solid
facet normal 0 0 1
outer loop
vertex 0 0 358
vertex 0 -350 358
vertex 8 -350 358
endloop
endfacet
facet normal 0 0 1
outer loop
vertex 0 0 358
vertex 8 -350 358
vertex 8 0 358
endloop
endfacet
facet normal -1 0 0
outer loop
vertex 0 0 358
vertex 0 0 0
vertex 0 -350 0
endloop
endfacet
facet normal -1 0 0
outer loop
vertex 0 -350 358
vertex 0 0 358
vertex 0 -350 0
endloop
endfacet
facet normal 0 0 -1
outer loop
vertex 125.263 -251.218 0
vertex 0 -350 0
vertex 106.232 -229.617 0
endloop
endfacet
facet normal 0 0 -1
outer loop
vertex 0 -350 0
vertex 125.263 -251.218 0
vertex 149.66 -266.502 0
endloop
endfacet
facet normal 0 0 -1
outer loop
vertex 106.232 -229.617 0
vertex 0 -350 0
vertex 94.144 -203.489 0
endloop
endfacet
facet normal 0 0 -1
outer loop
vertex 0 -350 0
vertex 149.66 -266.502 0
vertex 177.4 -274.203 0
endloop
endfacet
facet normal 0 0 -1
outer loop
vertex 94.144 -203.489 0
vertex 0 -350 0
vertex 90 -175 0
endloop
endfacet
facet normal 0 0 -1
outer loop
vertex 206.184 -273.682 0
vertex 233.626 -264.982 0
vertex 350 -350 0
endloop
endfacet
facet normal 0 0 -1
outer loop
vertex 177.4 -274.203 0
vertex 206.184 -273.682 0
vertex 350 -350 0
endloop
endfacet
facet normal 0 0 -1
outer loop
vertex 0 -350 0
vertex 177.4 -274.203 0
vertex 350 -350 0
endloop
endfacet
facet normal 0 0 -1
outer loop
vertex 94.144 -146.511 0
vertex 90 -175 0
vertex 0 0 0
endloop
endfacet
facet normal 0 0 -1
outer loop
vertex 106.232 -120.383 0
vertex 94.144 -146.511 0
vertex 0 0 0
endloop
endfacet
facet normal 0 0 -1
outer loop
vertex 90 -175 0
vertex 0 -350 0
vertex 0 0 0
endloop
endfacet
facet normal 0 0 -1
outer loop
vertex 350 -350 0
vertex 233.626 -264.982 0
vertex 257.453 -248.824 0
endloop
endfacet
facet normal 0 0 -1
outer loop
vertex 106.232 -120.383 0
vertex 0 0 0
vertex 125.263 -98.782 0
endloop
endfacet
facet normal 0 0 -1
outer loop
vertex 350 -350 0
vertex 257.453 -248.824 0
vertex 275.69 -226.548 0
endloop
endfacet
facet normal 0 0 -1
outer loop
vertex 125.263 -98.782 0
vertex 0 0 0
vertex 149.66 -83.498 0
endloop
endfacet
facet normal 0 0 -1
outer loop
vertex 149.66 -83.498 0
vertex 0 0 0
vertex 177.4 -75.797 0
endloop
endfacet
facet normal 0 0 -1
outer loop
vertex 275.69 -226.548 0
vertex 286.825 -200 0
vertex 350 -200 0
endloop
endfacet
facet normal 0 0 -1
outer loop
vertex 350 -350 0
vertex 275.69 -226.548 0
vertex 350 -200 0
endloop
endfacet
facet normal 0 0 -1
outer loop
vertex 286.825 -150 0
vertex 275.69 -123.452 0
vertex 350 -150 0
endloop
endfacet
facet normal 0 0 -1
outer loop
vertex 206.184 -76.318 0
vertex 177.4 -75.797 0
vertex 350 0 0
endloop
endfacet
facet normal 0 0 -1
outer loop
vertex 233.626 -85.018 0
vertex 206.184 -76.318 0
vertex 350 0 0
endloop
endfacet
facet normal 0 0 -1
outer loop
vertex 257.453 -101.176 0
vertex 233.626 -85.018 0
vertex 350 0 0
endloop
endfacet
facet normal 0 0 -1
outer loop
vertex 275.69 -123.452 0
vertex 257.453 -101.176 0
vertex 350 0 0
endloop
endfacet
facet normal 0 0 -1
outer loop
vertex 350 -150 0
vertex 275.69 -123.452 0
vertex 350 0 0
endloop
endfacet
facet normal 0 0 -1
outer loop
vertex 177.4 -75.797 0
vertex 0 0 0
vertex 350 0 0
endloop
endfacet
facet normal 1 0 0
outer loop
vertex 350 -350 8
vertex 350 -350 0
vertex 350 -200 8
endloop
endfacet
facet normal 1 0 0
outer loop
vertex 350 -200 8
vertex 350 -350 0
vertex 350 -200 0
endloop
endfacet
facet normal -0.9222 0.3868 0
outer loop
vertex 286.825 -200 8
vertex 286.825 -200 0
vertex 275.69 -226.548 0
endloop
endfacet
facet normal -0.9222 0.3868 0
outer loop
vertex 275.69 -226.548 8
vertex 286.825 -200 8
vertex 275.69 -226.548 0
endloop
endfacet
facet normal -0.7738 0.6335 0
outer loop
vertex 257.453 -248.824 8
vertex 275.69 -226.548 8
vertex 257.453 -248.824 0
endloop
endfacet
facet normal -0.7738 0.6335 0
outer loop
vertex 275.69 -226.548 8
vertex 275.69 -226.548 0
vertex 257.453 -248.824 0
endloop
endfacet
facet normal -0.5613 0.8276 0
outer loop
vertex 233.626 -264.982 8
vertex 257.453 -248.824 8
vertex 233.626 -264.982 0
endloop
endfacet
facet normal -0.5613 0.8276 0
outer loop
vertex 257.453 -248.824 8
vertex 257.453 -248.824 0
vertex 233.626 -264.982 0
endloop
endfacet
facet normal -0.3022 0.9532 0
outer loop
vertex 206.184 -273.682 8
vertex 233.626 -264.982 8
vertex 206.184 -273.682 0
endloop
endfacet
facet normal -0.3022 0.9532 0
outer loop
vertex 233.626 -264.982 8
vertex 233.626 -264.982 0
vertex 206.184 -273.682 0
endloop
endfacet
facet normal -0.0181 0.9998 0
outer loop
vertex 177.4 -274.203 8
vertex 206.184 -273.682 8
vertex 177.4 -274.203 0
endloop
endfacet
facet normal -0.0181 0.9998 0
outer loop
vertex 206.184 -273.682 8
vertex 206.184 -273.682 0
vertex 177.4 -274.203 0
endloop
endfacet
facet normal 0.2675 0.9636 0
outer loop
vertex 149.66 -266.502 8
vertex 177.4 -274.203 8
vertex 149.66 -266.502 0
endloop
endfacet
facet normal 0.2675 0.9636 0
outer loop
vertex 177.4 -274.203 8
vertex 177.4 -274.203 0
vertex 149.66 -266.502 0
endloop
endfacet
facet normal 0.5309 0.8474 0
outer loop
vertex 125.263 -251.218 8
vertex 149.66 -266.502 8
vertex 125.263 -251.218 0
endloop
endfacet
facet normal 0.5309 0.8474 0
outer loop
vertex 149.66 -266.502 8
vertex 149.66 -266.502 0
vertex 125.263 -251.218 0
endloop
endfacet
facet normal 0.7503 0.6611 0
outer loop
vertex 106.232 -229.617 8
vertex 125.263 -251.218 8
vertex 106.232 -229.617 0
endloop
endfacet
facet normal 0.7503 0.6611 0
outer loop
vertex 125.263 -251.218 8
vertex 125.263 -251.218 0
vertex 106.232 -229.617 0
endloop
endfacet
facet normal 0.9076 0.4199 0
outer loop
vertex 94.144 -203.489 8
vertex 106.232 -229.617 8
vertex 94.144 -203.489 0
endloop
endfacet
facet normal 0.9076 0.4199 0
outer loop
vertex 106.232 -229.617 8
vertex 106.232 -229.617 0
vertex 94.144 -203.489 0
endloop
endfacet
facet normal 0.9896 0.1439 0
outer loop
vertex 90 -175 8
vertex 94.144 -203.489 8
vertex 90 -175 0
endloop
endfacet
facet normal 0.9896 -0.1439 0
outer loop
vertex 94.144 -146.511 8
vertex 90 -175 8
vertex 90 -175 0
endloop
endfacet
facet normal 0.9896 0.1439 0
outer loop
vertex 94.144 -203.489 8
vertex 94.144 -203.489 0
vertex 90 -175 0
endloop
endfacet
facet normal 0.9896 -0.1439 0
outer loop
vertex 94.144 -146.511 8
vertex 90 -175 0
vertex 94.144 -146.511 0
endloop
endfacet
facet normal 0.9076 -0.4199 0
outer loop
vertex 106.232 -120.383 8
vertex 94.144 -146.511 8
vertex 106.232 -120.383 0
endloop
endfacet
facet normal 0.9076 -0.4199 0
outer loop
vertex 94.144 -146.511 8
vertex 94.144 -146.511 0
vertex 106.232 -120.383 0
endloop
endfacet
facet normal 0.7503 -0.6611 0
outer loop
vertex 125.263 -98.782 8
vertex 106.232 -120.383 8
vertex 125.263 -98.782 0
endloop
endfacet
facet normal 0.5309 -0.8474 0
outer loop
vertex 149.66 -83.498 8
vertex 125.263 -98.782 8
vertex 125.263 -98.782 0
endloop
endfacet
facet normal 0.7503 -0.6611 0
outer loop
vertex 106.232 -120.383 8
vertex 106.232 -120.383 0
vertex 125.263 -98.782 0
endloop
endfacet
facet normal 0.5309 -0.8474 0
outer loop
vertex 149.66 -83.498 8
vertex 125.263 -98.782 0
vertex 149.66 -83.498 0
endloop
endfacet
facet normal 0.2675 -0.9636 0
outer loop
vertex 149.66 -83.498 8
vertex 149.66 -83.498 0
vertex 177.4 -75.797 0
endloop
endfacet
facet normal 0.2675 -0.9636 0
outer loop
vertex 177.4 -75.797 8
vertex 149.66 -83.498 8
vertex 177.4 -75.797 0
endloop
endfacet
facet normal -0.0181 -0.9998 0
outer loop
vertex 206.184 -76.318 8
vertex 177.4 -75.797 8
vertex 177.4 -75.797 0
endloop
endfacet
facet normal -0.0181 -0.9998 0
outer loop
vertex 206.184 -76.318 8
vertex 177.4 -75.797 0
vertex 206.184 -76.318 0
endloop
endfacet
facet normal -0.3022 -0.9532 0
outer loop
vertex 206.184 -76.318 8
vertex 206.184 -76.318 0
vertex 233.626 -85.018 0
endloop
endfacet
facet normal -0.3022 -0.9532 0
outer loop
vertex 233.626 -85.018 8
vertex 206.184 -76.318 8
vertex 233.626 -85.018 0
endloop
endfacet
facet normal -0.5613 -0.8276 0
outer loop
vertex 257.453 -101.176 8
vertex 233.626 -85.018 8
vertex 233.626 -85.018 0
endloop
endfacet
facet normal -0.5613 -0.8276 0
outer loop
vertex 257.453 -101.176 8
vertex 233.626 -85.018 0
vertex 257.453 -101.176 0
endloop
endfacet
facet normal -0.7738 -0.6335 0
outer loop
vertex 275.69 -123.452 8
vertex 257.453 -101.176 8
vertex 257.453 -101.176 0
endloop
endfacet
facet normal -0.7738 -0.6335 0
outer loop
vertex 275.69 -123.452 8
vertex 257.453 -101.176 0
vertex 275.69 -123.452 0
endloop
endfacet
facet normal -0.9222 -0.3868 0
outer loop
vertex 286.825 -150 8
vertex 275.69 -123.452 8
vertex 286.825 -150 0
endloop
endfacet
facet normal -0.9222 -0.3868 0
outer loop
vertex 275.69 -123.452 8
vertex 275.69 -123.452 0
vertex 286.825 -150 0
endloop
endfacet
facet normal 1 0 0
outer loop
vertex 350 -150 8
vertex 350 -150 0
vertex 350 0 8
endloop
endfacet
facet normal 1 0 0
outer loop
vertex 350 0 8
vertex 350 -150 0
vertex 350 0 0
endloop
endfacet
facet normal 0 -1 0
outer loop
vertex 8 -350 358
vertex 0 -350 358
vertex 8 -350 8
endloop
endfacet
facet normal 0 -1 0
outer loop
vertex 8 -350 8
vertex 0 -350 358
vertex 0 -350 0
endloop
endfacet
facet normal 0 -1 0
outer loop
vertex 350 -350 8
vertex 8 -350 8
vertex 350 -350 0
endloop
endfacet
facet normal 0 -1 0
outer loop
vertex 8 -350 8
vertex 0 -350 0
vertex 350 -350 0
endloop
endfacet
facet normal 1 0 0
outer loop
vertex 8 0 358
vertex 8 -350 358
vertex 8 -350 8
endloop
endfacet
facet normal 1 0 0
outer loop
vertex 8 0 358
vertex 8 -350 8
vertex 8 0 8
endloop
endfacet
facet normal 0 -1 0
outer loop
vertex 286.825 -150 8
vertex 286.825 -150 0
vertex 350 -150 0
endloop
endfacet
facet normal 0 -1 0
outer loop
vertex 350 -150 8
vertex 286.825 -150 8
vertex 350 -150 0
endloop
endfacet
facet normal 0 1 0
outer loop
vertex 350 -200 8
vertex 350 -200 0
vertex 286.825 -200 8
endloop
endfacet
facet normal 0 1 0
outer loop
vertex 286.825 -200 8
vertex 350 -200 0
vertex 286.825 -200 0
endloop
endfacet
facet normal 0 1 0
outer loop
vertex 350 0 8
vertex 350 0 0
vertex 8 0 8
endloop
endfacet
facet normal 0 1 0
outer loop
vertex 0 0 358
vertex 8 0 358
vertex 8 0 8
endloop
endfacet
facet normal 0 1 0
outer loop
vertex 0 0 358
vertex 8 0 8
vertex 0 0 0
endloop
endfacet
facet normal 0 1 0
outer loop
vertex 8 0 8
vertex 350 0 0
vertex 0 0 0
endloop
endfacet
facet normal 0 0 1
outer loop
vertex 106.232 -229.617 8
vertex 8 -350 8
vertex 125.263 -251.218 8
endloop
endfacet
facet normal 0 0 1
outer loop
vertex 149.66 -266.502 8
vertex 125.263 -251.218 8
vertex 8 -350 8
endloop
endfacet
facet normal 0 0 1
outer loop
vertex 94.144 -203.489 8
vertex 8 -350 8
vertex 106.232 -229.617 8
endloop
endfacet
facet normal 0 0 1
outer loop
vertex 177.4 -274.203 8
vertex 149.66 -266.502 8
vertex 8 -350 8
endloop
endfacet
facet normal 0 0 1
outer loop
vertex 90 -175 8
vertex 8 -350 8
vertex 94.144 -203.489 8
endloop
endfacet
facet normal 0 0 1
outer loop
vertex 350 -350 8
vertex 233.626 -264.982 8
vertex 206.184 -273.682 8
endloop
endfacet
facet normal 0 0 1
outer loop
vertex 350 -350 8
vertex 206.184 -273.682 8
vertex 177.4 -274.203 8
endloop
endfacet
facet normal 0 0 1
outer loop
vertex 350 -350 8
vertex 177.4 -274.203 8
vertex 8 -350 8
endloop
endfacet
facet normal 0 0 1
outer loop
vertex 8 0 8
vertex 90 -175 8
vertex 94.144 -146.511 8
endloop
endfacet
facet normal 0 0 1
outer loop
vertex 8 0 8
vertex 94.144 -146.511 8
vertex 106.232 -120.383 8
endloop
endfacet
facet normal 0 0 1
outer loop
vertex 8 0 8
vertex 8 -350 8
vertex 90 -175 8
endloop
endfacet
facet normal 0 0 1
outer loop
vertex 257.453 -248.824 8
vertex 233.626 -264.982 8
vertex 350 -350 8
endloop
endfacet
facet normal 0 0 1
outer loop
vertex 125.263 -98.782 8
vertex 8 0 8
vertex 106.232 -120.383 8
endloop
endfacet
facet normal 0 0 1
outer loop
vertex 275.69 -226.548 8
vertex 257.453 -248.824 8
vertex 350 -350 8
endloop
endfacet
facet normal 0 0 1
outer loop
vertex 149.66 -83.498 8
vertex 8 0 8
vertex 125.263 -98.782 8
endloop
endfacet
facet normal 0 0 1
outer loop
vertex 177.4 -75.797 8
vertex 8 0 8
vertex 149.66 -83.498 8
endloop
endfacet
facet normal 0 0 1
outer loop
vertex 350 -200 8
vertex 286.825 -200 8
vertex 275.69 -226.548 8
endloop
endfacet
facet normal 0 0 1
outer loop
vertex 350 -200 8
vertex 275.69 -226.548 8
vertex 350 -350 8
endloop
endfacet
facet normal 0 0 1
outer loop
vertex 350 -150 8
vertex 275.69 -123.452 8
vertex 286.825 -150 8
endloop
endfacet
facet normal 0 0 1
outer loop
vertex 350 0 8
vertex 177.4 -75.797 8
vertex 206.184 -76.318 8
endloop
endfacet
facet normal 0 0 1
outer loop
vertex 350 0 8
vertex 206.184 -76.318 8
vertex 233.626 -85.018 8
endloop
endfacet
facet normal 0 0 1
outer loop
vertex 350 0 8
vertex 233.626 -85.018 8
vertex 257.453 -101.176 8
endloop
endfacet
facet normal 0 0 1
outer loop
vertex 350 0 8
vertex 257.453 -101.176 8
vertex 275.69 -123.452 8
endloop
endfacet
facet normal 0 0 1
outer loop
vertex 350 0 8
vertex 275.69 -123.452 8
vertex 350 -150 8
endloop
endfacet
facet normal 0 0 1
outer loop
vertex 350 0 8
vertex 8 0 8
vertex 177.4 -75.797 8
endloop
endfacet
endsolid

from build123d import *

# Parameters (mm, degrees)
F1_DEPTH = 8
F2_W     = 350
F2_H     = 358
F3_DEPTH = 8


with BuildPart() as f1:
    # F0 (on Top) → F1 (new body)
    with BuildSketch(Plane.XY):
        with BuildLine():
            Line((350, 0), (0, 0))
            Line((0, 0), (0, -350))
            Line((0, -350), (350, -350))
            Line((350, -350), (350, -200))
            Line((350, -200), (300, -200))
            Line((300, -200), (286.824584, -200))
            ThreePointArc((286.824584, -200), (90, -175), (286.824584, -150))
            Line((286.824584, -150), (300, -150))
            Line((300, -150), (350, -150))
            Line((350, -150), (350, 0))
        make_face()
    extrude(amount=F1_DEPTH)

    # F2 (on Right) → F3 (join)
    with BuildSketch(Plane.YZ):
        with Locations((-175, 179)):
            Rectangle(F2_W, F2_H)
    extrude(amount=F3_DEPTH)


solid = f1.part
